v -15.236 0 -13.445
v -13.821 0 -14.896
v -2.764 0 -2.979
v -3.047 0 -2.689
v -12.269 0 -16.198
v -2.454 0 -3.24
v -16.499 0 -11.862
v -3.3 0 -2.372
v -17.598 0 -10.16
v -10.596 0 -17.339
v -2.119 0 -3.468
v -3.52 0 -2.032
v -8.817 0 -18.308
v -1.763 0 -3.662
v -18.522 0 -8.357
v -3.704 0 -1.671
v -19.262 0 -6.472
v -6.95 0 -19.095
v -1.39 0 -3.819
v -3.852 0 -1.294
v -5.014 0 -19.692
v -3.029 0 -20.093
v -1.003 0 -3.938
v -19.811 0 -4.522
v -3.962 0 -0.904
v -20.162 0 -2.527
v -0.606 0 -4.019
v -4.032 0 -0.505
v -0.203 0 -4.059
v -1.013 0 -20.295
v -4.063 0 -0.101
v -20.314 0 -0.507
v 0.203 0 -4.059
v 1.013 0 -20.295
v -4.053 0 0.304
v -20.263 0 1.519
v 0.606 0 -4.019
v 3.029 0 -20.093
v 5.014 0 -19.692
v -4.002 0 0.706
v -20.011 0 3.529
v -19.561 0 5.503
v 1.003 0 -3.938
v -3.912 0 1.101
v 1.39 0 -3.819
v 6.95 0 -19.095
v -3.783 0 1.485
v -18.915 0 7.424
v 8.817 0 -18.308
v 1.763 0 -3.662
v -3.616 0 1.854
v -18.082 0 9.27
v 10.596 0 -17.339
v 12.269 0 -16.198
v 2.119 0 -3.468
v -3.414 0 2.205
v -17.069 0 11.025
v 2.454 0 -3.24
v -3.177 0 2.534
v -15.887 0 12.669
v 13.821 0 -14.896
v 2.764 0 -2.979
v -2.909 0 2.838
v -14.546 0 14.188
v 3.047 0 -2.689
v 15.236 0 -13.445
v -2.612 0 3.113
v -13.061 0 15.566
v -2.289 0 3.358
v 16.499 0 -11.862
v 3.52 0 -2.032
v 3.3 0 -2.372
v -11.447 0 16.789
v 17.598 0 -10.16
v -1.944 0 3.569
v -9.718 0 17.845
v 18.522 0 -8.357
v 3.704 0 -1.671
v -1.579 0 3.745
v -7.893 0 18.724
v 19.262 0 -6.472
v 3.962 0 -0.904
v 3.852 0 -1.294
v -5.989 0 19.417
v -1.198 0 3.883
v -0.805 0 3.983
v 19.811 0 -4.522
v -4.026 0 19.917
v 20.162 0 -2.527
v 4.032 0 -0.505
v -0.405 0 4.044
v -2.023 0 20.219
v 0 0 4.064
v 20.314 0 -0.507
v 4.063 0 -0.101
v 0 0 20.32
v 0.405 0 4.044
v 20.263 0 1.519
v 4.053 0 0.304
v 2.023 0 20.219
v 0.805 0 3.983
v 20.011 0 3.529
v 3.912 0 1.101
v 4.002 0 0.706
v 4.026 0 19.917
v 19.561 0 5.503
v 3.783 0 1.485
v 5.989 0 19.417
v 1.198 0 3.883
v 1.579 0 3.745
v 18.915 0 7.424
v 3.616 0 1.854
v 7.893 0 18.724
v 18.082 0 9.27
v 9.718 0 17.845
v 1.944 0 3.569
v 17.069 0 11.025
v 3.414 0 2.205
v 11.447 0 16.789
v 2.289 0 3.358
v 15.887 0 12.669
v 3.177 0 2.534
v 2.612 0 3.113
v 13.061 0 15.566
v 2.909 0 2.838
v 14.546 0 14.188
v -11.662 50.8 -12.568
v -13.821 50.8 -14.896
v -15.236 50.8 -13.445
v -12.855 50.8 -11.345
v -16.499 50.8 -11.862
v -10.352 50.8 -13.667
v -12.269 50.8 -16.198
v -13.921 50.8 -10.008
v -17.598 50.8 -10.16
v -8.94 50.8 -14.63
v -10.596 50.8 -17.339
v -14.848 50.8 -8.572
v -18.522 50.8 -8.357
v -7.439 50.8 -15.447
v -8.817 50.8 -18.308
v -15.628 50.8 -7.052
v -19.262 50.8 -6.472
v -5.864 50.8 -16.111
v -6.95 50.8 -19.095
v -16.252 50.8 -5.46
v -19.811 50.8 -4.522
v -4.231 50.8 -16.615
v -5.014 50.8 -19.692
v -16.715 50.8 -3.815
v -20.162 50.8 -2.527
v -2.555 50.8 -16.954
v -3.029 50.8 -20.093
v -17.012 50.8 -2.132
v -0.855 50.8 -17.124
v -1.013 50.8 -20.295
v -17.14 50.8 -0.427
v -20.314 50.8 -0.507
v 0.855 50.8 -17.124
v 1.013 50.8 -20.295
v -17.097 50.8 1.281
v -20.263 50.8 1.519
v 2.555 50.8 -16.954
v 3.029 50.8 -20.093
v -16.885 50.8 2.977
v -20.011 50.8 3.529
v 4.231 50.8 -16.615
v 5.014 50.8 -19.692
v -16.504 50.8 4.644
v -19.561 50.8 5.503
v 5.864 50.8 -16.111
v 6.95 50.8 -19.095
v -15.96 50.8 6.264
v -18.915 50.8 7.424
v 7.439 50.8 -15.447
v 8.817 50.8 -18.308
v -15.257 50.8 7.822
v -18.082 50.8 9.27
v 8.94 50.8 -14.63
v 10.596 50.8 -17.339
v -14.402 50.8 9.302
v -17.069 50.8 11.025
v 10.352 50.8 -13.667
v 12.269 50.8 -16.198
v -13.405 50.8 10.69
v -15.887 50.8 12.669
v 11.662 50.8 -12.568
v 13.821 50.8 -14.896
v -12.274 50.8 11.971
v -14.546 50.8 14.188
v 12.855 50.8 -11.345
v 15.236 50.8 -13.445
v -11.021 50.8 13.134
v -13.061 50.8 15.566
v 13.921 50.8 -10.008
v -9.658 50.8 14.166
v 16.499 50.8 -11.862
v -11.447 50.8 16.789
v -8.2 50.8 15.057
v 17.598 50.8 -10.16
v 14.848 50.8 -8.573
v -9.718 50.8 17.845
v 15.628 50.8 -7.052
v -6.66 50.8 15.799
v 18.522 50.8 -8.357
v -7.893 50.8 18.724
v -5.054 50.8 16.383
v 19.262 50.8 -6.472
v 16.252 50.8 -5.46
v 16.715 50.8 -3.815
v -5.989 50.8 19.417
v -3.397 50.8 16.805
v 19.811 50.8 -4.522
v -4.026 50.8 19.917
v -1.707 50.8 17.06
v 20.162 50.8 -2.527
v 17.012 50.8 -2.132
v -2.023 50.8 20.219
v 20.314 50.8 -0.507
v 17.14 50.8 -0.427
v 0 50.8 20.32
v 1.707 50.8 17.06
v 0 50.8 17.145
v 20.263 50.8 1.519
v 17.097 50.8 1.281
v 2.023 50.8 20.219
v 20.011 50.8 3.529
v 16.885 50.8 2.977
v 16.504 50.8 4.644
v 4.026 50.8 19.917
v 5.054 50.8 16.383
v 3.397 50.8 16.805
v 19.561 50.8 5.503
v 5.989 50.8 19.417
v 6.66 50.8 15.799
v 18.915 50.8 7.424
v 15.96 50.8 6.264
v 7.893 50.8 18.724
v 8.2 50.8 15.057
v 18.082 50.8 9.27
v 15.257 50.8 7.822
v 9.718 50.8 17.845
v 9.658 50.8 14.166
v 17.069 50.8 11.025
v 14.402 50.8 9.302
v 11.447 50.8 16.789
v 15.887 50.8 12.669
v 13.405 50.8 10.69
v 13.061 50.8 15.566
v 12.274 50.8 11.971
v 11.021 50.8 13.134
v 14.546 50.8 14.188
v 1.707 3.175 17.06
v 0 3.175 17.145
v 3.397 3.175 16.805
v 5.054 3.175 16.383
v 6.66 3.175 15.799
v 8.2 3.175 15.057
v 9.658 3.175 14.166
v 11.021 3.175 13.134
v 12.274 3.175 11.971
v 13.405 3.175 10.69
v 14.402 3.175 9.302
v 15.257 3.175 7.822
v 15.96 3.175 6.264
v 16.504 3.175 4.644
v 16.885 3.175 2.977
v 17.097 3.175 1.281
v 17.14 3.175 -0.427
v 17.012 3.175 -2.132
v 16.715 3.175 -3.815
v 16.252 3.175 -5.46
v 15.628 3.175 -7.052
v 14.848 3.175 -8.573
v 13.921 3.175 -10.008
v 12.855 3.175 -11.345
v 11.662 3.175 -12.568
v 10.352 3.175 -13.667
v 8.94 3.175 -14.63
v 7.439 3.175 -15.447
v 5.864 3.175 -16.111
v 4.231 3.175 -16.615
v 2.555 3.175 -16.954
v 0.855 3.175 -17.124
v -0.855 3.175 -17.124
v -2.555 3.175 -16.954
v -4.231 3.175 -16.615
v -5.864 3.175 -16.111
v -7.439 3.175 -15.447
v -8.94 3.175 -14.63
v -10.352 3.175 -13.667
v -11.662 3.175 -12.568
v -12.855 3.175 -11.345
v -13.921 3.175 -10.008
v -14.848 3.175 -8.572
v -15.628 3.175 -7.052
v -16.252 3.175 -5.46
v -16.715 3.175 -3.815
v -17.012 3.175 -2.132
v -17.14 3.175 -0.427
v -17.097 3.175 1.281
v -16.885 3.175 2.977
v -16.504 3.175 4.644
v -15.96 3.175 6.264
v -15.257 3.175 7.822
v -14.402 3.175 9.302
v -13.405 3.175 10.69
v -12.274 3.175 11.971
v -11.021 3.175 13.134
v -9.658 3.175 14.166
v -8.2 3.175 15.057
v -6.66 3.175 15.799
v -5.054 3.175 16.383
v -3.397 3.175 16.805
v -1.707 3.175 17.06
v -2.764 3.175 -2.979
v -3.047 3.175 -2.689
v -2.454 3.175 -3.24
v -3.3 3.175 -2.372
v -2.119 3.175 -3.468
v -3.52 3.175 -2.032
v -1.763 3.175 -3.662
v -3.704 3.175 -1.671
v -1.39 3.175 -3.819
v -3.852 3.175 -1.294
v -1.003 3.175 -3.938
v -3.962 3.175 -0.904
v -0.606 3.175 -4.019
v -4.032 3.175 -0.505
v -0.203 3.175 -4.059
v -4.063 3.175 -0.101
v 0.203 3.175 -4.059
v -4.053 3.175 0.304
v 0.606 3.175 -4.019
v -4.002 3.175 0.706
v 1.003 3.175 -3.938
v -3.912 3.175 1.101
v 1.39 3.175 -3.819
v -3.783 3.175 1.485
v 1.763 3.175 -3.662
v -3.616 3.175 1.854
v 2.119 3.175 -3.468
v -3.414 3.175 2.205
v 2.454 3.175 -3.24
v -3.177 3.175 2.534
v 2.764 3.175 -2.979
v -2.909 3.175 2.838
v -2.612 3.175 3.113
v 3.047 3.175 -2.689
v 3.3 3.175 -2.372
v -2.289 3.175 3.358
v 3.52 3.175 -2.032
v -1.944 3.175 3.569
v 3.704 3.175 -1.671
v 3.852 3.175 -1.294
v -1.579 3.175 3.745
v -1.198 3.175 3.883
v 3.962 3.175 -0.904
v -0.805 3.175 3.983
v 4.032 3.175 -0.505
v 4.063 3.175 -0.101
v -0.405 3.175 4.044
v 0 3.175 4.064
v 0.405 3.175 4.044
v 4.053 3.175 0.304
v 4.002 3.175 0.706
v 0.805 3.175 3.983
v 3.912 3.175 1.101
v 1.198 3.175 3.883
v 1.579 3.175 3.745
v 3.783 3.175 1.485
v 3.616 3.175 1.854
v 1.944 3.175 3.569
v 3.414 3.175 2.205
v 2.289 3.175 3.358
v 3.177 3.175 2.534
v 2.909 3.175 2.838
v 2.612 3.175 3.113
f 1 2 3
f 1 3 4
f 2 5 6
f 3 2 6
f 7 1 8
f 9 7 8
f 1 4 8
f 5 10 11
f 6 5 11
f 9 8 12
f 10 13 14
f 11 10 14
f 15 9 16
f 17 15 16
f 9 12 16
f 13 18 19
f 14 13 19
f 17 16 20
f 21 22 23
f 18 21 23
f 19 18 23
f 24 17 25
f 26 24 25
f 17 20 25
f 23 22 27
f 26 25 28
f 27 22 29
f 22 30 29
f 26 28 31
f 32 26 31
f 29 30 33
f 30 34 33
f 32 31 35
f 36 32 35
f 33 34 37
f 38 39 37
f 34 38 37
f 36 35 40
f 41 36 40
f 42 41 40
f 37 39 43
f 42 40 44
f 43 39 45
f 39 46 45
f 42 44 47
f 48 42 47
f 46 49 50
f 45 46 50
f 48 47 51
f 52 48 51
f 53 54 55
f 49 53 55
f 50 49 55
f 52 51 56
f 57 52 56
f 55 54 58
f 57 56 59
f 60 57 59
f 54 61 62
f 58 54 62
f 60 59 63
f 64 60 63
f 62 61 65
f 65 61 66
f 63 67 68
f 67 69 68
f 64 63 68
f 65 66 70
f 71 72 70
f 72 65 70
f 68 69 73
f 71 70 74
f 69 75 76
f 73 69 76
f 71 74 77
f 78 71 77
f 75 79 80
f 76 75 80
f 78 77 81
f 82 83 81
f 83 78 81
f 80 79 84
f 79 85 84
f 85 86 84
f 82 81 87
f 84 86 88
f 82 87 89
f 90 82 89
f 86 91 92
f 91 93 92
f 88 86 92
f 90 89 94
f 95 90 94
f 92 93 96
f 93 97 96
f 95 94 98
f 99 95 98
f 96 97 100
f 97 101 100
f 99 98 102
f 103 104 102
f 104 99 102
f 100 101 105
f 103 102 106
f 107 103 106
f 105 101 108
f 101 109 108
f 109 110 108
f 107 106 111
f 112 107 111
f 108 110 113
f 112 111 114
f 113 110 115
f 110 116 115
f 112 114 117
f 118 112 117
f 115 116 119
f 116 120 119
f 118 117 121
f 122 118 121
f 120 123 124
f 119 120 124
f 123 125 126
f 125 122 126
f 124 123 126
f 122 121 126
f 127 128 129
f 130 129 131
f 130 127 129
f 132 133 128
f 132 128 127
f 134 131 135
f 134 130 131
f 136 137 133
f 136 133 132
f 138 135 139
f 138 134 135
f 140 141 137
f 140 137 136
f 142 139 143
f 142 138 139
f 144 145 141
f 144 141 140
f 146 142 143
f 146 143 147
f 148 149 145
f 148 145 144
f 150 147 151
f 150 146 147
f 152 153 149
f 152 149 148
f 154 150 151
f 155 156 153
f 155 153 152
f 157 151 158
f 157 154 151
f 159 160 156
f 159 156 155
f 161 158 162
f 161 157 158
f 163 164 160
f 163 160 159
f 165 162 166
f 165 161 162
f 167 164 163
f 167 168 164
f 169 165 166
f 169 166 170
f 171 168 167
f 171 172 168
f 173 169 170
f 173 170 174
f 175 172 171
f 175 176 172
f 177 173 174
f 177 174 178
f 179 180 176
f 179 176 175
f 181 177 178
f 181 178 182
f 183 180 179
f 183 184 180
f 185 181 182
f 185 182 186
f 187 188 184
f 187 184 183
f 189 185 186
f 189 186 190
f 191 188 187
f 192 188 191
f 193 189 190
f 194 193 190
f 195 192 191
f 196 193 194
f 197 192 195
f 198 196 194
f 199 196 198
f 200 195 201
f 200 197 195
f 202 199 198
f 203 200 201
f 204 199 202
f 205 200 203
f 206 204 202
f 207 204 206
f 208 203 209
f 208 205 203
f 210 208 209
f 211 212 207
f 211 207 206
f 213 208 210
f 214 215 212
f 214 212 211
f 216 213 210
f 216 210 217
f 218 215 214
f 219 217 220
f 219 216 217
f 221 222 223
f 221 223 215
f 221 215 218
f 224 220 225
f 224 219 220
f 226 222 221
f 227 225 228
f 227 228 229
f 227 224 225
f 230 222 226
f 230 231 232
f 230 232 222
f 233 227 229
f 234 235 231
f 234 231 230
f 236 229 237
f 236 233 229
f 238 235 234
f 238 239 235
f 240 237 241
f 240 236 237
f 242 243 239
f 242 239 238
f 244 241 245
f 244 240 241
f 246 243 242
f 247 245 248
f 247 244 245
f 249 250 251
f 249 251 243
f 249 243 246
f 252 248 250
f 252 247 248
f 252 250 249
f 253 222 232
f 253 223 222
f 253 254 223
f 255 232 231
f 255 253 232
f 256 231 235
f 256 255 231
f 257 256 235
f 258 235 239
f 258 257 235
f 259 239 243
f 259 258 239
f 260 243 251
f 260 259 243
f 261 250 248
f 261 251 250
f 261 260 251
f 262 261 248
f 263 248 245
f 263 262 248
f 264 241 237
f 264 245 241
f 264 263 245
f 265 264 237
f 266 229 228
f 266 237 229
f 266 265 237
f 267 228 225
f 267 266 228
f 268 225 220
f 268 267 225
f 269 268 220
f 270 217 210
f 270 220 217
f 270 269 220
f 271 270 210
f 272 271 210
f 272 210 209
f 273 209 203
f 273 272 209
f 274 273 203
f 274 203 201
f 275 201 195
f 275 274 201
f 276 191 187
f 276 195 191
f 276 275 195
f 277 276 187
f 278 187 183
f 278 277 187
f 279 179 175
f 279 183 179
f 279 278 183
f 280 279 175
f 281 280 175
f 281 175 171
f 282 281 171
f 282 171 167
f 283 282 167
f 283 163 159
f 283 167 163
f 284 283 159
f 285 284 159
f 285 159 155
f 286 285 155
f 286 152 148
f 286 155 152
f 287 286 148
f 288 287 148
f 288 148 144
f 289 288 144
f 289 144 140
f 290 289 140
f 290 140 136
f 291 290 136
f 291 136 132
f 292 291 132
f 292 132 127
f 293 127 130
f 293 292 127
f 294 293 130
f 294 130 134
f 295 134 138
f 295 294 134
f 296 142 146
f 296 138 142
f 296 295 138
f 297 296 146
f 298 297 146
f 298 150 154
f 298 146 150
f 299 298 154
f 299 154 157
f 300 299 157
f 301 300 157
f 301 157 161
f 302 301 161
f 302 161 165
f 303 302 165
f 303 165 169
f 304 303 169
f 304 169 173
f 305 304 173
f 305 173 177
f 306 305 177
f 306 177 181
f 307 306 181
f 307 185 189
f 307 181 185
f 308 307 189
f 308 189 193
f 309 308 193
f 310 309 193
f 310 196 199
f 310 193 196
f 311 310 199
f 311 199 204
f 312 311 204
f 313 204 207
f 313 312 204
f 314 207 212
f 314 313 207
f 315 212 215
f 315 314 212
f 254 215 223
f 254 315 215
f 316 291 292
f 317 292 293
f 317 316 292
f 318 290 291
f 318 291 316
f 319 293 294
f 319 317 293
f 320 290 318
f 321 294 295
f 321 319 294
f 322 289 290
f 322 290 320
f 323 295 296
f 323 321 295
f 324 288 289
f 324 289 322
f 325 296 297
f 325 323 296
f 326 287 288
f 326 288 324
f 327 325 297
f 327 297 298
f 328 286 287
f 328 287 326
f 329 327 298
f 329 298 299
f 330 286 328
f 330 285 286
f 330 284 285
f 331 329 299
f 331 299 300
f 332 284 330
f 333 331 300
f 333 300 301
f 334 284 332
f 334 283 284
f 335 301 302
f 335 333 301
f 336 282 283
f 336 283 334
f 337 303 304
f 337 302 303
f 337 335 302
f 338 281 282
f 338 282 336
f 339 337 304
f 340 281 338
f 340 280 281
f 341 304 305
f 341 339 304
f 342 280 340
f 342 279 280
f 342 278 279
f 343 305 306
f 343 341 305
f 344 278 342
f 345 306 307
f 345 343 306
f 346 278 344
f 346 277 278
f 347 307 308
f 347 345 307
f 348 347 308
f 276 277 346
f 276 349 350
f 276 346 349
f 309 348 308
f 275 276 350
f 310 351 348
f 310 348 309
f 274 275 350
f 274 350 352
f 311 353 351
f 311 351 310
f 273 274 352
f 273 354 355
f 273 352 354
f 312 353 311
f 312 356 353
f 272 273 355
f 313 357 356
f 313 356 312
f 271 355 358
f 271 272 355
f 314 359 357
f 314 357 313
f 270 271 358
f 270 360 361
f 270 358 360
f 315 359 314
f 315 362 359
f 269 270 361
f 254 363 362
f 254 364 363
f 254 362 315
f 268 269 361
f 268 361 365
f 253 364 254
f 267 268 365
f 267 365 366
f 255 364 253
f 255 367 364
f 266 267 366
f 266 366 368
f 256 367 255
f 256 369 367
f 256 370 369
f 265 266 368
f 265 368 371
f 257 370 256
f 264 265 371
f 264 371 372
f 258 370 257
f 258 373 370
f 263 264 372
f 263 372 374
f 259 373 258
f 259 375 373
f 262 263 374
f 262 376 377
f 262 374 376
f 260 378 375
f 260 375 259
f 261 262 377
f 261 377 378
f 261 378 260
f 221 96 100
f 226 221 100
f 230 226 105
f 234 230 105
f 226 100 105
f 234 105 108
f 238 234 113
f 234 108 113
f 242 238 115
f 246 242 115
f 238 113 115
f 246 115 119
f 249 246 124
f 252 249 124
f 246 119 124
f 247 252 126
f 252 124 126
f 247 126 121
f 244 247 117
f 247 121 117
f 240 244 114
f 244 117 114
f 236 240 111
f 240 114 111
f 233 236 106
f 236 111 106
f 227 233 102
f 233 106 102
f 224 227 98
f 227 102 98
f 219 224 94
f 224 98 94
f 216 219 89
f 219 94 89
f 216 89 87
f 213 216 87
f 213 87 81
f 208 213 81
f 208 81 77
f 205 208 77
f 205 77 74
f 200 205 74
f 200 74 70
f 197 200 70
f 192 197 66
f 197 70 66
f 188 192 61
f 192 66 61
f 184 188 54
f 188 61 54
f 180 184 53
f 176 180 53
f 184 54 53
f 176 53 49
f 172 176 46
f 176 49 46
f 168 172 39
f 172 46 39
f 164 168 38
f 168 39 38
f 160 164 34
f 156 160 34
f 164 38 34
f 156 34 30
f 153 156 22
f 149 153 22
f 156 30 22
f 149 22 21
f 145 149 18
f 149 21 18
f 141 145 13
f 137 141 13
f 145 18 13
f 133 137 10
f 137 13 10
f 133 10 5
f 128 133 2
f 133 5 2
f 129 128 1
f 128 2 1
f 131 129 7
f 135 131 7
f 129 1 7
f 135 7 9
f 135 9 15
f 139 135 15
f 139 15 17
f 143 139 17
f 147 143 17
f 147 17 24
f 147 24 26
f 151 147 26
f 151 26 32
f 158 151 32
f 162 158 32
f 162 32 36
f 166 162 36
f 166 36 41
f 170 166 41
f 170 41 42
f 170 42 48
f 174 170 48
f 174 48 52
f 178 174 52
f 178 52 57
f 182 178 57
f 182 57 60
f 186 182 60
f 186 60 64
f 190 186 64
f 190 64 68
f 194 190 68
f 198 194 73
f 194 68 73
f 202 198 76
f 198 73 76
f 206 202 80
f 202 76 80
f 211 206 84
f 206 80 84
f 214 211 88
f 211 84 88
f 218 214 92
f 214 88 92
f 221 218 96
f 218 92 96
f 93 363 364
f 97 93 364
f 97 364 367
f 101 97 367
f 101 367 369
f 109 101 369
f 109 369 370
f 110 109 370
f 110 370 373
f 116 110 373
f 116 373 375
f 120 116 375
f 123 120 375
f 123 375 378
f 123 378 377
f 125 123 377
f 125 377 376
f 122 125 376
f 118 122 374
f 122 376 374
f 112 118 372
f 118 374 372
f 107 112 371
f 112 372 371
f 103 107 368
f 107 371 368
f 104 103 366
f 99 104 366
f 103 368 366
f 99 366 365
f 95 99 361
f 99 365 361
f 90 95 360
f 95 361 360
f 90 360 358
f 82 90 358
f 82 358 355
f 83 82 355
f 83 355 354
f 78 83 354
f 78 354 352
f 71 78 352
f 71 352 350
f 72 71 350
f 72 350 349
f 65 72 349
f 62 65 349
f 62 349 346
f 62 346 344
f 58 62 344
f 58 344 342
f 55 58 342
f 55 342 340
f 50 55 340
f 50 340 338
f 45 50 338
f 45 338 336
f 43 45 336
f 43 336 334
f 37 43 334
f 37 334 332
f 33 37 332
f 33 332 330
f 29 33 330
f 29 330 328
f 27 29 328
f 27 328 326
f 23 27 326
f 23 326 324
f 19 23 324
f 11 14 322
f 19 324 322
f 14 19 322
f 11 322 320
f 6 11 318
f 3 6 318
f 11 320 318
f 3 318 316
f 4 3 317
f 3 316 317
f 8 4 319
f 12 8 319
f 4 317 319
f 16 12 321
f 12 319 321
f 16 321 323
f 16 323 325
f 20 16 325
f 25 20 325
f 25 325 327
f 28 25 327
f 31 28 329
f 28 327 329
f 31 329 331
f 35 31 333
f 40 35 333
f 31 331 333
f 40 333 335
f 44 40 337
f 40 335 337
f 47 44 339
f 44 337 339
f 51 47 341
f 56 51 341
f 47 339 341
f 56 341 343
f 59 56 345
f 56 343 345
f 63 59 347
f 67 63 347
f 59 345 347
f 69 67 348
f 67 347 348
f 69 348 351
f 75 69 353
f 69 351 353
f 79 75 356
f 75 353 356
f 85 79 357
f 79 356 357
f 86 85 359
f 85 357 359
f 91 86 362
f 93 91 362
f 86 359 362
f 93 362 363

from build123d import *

# Parameters (mm, degrees)
SKETCH1_R               = 20.32
BOSS_EXTRUDE1_DEPTH     = 50.8
SHELL1_T                = -3.175
SKETCH2_R               = 4.064
CUT_EXTRUDE1_DEPTH      = 56.623245366
CUT_EXTRUDE1_DEPTH_BACK = 46.482


with BuildPart() as part:
    # Sketch1 → Boss-Extrude1 (new body)
    with BuildSketch(Plane(origin=(0, 0, 0), x_dir=(1, 0, 0), z_dir=(0, 1, 0))):
        with Locations(Location((0, 0, 0), (0, 0, 270))):
            Circle(SKETCH1_R)
    extrude(amount=BOSS_EXTRUDE1_DEPTH)

    # Shell1
    shell1_openings = [part.faces().sort_by_distance(p)[0] for p in [
        (0, 50.8, 0),
    ]]
    offset(amount=SHELL1_T, openings=shell1_openings, kind=Kind.INTERSECTION)

    # Sketch2 → Cut-Extrude1 (cut, two sides)
    with BuildSketch(Plane(origin=(0, 3.175, 0), x_dir=(1, 0, 0), z_dir=(0, 1, 0))) as cut_extrude1_sk:
        with Locations(Location((0, 0, 0), (0, 0, 270))):
            Circle(SKETCH2_R)
    extrude(amount=CUT_EXTRUDE1_DEPTH, mode=Mode.SUBTRACT)
    extrude(cut_extrude1_sk.sketch, amount=-CUT_EXTRUDE1_DEPTH_BACK, mode=Mode.SUBTRACT)


solid = part.part
